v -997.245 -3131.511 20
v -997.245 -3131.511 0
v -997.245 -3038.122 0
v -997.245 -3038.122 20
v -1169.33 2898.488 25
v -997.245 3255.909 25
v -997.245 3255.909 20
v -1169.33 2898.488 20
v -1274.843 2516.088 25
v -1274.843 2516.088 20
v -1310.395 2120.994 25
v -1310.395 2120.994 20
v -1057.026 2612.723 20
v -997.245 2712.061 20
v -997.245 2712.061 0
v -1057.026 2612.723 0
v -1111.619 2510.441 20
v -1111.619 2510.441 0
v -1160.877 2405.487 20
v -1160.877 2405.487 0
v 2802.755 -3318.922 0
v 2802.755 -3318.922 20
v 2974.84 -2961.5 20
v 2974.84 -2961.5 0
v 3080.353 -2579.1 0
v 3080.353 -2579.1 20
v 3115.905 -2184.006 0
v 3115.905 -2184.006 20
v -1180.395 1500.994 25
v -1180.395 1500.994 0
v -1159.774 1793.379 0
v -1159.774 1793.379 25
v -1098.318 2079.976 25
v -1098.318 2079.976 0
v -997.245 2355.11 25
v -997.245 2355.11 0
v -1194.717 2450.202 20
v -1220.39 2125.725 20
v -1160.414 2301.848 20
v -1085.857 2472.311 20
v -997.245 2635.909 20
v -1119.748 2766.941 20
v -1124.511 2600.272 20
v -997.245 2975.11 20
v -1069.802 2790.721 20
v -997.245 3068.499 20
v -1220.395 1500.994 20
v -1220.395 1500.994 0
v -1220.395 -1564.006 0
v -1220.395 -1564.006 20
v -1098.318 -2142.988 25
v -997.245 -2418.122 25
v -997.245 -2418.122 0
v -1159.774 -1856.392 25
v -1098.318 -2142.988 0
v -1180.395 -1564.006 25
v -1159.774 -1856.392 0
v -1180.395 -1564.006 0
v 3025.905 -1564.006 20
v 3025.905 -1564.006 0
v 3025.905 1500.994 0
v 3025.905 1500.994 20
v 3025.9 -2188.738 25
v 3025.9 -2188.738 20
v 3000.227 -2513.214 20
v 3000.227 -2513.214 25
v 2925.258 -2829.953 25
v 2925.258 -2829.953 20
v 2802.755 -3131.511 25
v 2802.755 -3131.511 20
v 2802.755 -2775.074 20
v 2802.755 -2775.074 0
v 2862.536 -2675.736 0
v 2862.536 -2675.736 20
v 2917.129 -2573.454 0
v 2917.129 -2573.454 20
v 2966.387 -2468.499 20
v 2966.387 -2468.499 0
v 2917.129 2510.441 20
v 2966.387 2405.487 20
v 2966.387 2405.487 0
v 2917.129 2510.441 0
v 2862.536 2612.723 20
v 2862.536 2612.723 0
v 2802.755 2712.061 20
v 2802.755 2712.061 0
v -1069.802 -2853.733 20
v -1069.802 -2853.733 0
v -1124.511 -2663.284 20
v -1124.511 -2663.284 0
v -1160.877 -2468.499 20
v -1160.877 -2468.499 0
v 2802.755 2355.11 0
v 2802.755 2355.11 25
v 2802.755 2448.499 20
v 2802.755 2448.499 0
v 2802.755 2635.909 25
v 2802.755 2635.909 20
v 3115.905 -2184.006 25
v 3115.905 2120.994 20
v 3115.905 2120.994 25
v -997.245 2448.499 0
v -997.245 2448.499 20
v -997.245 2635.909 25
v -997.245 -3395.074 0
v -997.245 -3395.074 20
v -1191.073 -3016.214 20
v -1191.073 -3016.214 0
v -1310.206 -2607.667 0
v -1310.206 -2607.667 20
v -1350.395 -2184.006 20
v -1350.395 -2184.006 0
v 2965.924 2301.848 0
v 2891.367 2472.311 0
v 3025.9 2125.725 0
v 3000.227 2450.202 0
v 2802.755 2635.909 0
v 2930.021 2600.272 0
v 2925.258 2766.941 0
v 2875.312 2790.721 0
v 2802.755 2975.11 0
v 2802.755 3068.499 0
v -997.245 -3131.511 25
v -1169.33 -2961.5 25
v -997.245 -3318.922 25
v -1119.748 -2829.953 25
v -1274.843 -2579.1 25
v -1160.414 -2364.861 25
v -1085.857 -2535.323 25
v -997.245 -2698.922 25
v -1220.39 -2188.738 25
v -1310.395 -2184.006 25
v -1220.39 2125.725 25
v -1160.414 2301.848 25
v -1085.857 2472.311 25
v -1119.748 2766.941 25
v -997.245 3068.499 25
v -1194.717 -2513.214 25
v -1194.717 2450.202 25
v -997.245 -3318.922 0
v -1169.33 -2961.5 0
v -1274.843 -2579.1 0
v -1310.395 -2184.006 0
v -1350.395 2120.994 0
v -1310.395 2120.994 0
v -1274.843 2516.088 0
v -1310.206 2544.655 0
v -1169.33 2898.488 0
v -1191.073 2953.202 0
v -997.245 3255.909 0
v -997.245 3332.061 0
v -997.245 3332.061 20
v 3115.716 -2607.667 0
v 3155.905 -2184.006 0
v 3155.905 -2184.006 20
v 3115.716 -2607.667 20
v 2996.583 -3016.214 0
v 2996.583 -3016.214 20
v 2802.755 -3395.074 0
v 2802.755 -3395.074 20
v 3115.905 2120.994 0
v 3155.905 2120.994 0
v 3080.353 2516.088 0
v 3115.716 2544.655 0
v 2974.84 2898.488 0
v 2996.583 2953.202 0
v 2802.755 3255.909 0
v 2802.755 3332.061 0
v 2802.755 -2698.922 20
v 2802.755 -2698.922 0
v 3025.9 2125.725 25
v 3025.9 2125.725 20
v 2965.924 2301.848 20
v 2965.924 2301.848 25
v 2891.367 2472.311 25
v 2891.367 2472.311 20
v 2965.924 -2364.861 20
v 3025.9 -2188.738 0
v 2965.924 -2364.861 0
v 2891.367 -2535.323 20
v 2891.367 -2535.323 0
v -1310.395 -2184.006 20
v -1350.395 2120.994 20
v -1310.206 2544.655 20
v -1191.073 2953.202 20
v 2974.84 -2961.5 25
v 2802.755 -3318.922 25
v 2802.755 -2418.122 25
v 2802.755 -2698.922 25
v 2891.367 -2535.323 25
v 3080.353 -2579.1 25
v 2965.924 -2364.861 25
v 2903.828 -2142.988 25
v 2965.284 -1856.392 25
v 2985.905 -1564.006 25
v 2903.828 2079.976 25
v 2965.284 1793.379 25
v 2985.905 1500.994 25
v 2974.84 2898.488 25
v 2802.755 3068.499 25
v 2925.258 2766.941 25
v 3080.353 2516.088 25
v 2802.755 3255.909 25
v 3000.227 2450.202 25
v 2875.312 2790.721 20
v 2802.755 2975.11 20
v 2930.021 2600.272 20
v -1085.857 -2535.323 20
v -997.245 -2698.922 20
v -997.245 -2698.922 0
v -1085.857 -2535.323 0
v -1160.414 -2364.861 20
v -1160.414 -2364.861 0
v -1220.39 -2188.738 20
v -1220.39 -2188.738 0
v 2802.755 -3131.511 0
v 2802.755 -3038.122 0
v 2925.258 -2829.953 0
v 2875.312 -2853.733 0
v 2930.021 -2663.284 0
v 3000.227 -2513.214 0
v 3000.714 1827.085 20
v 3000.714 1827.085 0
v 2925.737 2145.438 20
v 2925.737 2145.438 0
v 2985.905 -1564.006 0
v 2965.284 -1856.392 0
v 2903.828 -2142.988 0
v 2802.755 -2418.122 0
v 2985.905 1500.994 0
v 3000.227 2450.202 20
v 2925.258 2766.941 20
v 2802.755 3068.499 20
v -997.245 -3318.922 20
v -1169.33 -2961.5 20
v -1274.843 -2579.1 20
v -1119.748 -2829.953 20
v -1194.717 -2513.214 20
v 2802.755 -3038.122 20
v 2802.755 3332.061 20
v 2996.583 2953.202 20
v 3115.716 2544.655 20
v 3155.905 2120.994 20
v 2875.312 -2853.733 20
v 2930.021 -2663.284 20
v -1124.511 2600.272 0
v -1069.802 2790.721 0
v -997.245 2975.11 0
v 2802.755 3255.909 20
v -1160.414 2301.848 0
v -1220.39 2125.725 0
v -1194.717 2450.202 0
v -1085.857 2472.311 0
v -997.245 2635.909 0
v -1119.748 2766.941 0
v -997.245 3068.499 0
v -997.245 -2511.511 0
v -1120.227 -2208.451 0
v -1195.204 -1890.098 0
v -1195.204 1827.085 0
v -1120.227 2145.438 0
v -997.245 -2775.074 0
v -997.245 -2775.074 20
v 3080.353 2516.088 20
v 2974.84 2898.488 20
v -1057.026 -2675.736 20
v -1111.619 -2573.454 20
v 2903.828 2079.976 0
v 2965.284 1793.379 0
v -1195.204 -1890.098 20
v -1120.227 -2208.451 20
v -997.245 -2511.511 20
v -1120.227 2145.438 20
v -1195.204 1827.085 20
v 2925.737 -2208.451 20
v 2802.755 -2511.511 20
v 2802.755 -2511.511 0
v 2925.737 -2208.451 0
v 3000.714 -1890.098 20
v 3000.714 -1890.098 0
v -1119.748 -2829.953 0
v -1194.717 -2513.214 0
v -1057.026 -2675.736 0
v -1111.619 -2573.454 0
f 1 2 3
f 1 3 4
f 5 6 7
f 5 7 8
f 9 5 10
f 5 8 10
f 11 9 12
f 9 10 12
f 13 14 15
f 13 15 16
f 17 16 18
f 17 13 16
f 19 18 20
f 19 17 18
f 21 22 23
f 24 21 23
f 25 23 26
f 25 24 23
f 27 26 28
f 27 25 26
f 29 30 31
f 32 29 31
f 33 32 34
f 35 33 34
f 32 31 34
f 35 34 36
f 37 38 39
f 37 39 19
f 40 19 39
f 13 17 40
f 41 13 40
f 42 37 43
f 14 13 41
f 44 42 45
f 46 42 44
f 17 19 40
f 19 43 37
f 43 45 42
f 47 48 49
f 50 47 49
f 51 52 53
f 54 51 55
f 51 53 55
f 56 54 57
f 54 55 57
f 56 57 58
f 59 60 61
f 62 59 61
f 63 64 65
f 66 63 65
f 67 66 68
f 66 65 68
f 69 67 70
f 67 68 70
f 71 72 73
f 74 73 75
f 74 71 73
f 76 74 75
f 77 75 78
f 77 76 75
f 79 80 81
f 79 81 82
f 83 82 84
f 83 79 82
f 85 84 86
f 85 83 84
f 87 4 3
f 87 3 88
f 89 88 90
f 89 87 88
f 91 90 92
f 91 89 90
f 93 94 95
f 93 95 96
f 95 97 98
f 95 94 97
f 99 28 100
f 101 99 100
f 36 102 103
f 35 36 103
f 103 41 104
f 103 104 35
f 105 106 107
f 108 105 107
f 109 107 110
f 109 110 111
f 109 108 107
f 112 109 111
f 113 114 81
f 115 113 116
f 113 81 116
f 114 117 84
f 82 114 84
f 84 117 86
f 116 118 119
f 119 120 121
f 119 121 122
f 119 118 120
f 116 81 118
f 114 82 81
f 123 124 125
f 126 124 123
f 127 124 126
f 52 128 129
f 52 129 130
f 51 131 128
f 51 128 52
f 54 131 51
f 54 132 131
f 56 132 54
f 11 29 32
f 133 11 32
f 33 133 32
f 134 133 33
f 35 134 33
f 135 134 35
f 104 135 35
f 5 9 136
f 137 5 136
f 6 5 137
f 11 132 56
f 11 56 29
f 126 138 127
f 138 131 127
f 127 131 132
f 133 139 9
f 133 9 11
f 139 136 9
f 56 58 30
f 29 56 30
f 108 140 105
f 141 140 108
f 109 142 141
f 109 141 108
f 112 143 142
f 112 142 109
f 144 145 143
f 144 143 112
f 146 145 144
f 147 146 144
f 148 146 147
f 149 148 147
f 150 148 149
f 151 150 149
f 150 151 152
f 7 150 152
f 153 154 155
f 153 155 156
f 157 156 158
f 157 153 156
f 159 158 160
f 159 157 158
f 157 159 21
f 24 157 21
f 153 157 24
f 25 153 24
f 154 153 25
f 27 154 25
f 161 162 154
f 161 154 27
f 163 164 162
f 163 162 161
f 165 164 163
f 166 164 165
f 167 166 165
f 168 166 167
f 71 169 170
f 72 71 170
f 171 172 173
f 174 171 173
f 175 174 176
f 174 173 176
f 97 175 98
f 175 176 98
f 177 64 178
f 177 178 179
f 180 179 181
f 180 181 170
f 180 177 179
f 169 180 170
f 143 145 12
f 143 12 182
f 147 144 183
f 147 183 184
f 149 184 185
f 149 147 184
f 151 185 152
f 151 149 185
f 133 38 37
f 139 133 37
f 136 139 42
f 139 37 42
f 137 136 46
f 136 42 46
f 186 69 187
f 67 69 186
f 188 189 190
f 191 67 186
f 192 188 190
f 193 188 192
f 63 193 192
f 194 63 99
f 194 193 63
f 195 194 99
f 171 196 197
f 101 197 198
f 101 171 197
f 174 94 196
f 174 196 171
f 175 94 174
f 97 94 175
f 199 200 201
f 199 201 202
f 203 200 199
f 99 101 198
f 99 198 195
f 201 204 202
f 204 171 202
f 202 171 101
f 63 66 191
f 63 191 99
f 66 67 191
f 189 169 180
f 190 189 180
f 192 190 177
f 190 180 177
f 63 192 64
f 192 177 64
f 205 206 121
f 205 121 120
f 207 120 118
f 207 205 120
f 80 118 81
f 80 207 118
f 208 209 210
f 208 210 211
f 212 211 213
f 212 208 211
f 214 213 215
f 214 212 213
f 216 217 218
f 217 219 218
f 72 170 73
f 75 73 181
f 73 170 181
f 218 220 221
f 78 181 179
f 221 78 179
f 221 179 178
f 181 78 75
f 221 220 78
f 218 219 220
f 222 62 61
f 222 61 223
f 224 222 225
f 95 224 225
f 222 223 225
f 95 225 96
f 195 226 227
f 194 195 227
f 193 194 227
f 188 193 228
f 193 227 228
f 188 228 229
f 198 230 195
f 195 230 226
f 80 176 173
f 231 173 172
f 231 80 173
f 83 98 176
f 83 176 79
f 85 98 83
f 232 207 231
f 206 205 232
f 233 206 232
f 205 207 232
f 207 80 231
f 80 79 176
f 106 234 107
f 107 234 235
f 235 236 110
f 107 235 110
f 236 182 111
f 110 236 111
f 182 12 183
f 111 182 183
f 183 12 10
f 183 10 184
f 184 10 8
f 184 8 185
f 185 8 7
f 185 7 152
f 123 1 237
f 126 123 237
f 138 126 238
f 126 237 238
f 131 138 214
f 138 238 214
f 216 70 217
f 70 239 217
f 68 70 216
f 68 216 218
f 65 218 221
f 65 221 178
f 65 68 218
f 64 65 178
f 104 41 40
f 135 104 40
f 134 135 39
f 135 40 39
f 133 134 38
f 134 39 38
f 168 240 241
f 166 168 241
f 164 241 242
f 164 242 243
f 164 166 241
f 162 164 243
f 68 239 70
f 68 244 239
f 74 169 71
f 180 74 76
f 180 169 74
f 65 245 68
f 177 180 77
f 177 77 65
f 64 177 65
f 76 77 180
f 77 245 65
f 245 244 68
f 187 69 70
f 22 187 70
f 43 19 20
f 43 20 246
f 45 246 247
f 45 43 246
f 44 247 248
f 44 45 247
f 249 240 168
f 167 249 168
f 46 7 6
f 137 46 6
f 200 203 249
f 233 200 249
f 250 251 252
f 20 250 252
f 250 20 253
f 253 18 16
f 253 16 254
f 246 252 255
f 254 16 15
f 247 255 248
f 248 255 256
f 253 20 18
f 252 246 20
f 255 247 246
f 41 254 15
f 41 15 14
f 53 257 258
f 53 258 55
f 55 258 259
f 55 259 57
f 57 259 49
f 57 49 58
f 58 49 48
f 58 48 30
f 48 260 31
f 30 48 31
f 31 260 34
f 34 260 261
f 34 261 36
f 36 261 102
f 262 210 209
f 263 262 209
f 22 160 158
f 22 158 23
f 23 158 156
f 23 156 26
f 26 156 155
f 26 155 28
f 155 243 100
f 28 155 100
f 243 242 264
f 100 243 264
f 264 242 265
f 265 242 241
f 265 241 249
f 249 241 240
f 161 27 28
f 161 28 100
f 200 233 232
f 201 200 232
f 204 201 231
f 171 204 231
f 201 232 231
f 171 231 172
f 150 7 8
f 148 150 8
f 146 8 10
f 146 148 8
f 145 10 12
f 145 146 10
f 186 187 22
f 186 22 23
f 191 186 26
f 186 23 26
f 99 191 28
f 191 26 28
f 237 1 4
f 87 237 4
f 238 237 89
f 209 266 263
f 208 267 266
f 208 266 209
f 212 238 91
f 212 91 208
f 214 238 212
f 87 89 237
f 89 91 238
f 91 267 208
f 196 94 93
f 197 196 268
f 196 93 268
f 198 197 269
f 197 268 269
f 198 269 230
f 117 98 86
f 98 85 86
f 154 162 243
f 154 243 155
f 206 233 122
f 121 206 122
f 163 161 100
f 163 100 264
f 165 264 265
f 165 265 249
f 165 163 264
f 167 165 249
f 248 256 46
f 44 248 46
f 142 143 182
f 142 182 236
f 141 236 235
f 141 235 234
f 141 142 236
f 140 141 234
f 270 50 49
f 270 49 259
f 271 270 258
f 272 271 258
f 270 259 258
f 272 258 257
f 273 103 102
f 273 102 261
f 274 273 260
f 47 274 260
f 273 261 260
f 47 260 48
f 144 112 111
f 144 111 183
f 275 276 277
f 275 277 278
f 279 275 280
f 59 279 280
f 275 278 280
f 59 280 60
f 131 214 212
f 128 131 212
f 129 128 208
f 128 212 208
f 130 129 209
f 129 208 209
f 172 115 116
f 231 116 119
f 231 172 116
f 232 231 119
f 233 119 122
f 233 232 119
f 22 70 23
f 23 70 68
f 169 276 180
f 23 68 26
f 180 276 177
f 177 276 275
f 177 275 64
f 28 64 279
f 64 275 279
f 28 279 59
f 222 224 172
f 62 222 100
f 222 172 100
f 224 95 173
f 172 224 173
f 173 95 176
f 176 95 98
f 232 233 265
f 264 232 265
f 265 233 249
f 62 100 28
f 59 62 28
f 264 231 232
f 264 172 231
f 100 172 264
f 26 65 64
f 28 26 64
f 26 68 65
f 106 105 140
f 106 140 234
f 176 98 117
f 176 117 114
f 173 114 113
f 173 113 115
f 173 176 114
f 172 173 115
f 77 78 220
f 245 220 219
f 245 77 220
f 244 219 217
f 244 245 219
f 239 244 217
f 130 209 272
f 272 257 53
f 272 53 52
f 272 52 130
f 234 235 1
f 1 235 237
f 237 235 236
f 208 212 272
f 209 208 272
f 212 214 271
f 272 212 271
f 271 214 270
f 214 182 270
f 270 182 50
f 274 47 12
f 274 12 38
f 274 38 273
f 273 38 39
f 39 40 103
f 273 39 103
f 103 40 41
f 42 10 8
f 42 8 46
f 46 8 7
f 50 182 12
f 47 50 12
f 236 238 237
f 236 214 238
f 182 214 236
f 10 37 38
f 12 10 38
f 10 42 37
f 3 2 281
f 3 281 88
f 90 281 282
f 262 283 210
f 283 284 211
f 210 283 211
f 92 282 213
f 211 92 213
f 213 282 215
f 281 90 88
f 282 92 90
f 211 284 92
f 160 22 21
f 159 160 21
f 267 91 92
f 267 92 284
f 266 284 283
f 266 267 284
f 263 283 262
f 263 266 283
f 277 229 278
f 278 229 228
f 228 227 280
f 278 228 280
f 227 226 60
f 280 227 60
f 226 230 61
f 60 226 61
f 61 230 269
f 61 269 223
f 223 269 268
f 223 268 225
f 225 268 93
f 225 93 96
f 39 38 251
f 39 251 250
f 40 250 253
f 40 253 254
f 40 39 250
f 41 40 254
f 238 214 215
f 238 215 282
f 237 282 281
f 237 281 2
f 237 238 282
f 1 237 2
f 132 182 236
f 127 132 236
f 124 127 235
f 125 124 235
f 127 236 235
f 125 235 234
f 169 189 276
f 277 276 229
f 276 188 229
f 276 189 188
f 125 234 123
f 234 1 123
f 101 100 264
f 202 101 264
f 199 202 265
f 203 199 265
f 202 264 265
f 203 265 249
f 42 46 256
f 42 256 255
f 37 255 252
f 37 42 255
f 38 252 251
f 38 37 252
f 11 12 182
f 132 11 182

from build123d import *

# Parameters (mm, degrees)
BOSS_EXTRUDE1_DEPTH   = 20
BOSS_EXTRUDE1_2_DEPTH = 20
BOSS_EXTRUDE2_DEPTH   = 20
BOSS_EXTRUDE2_2_DEPTH = 20
BOSS_EXTRUDE3_DEPTH   = 5
SKETCH5_W             = 3800
SKETCH5_H             = 576.541900626
CUT_EXTRUDE1_DEPTH    = 9360.453457287


with BuildPart() as part:
    # Sketch1 → Boss-Extrude1 (new body)
    with BuildSketch(Plane.XY):
        with BuildLine():
            ThreePointArc((3025.904993677, 1500.993778109), (902.754993677, 3624.143778109), (-1220.395006323, 1500.993778109))
            Line((-1220.395006323, 1500.993778109), (-1220.395006323, -1564.006221891))
            ThreePointArc((-1220.395006323, -1564.006221891), (902.754993677, -3687.156221891), (3025.904993677, -1564.006221891))
            Line((3025.904993677, -1564.006221891), (3025.904993677, 1500.993778109))
        make_face()
        with BuildLine():
            Line((-1180.395006323, -1564.006221891), (-1180.395006323, 1500.993778109))
            ThreePointArc((-1180.395006323, 1500.993778109), (902.754993677, 3584.143778109), (2985.904993677, 1500.993778109))
            Line((2985.904993677, 1500.993778109), (2985.904993677, -1564.006221891))
            ThreePointArc((2985.904993677, -1564.006221891), (902.754993677, -3647.156221891), (-1180.395006323, -1564.006221891))
        make_face(mode=Mode.SUBTRACT)
    extrude(amount=BOSS_EXTRUDE1_DEPTH)

    # Sketch3 → Boss-Extrude3 (add)
    with BuildSketch(Plane.XY.offset(20)):
        with BuildLine():
            ThreePointArc((-1310.395006323, -2184.006221891), (902.754993677, -4397.156221891), (3115.904993677, -2184.006221891))
            Line((3115.904993677, -2184.006221891), (3115.904993677, 2120.993778109))
            ThreePointArc((3115.904993677, 2120.993778109), (902.754993677, 4334.143778109), (-1310.395006323, 2120.993778109))
            Line((-1310.395006323, 2120.993778109), (-1310.395006323, -2184.006221891))
        make_face()
        with BuildLine():
            ThreePointArc((3025.899721638, -2188.737673504), (902.754993677, -4307.156221891), (-1220.389734283, -2188.737673504))
            ThreePointArc((-1220.389734283, -2188.737673504), (902.754993677, -3777.156221891), (3025.899721638, -2188.737673504))
        make_face(mode=Mode.SUBTRACT)
        with BuildLine():
            ThreePointArc((-1180.395006323, 1500.993778109), (902.754993677, 3584.143778109), (2985.904993677, 1500.993778109))
            Line((2985.904993677, 1500.993778109), (2985.904993677, -1564.006221891))
            ThreePointArc((2985.904993677, -1564.006221891), (902.754993677, -3647.156221891), (-1180.395006323, -1564.006221891))
            Line((-1180.395006323, -1564.006221891), (-1180.395006323, 1500.993778109))
        make_face(mode=Mode.SUBTRACT)
        with BuildLine():
            ThreePointArc((-1220.389734283, 2125.725229722), (902.754993677, 4244.143778109), (3025.899721638, 2125.725229722))
            ThreePointArc((3025.899721638, 2125.725229722), (902.754993677, 3714.143778109), (-1220.389734283, 2125.725229722))
        make_face(mode=Mode.SUBTRACT)
    extrude(amount=BOSS_EXTRUDE3_DEPTH)


with BuildPart() as body_2:
    # Sketch1 → Boss-Extrude1 2 (new body)
    with BuildSketch(Plane.XY):
        with BuildLine():
            ThreePointArc((3155.904993677, 2120.993778109), (902.754993677, 4374.143778109), (-1350.395006323, 2120.993778109))
            Line((-1350.395006323, 2120.993778109), (-1350.395006323, -2184.006221891))
            ThreePointArc((-1350.395006323, -2184.006221891), (902.754993677, -4437.156221891), (3155.904993677, -2184.006221891))
            Line((3155.904993677, -2184.006221891), (3155.904993677, 2120.993778109))
        make_face()
        with BuildLine():
            Line((-1310.395006323, -2184.006221891), (-1310.395006323, 2120.993778109))
            ThreePointArc((-1310.395006323, 2120.993778109), (902.754993677, 4334.143778109), (3115.904993677, 2120.993778109))
            Line((3115.904993677, 2120.993778109), (3115.904993677, -2184.006221891))
            ThreePointArc((3115.904993677, -2184.006221891), (902.754993677, -4397.156221891), (-1310.395006323, -2184.006221891))
        make_face(mode=Mode.SUBTRACT)
    extrude(amount=BOSS_EXTRUDE1_2_DEPTH)


with BuildPart() as body_3:
    # Sketch2 → Boss-Extrude2 (new body)
    with BuildSketch(Plane.XY.offset(20)):
        with BuildLine():
            ThreePointArc((3025.899721638, 2125.725229722), (902.754993677, 4244.143778109), (-1220.389734283, 2125.725229722))
            ThreePointArc((-1220.389734283, 2125.725229722), (902.754993677, 3714.143778109), (3025.899721638, 2125.725229722))
        make_face()
        with BuildLine():
            ThreePointArc((-1160.877193096, 2405.486520044), (902.754993677, 4204.143778109), (2966.387180451, 2405.486520044))
            ThreePointArc((2966.387180451, 2405.486520044), (902.754993677, 3754.143778109), (-1160.877193096, 2405.486520044))
        make_face(mode=Mode.SUBTRACT)
    extrude(amount=-BOSS_EXTRUDE2_DEPTH)


with BuildPart() as body_4:
    # Sketch2 → Boss-Extrude2 2 (new body)
    with BuildSketch(Plane.XY.offset(20)):
        with BuildLine():
            ThreePointArc((-1220.389734283, -2188.737673504), (902.754993677, -4307.156221891), (3025.899721638, -2188.737673504))
            ThreePointArc((3025.899721638, -2188.737673504), (902.754993677, -3777.156221891), (-1220.389734283, -2188.737673504))
        make_face()
        with BuildLine():
            ThreePointArc((2966.387180451, -2468.498963827), (902.754993677, -4267.156221891), (-1160.877193096, -2468.498963827))
            ThreePointArc((-1160.877193096, -2468.498963827), (902.754993677, -3817.156221891), (2966.387180451, -2468.498963827))
        make_face(mode=Mode.SUBTRACT)
    extrude(amount=-BOSS_EXTRUDE2_2_DEPTH)


with BuildPart() as cut_extrude1_tool:
    # Sketch5 → Cut-Extrude1 (new, through all)
    with BuildSketch(Plane(origin=(0, 4374.143778109, 0), x_dir=(1, 0, 0), z_dir=(0, 1, 0))):
        with Locations((902.754993677, -10)):
            Rectangle(SKETCH5_W, SKETCH5_H)
    extrude(amount=-CUT_EXTRUDE1_DEPTH)


with BuildPart() as part_1:
    add(part.part)

    # Cut-Extrude1: cut by cut_extrude1_tool
    add(cut_extrude1_tool.part, mode=Mode.SUBTRACT)


with BuildPart() as body_2_1:
    add(body_2.part)

    # Cut-Extrude1: cut by cut_extrude1_tool
    add(cut_extrude1_tool.part, mode=Mode.SUBTRACT)


with BuildPart() as body_3_1:
    add(body_3.part)

    # Cut-Extrude1: cut by cut_extrude1_tool
    add(cut_extrude1_tool.part, mode=Mode.SUBTRACT)


with BuildPart() as body_4_1:
    add(body_4.part)

    # Cut-Extrude1: cut by cut_extrude1_tool
    add(cut_extrude1_tool.part, mode=Mode.SUBTRACT)


with BuildPart() as cut_extrude1_piece_1:
    # of the separate pieces the step leaves, piece 1, a body of its own (cut_extrude1_pieces)
    add(part_1.part.solids().sort_by_distance((-997.245006323, 2448.498882317, 0))[0])


with BuildPart() as cut_extrude1_piece_2:
    # of the separate pieces the step leaves, piece 2, a body of its own (cut_extrude1_pieces)
    add(part_1.part.solids().sort_by_distance((3025.904993677, 1500.993778109, 0))[0])


with BuildPart() as cut_extrude1_piece_1_of_body_2:
    # of the separate pieces the step leaves, piece 1, a body of its own (cut_extrude1_pieces_of_body_2)
    add(body_2_1.part.solids().sort_by_distance((2802.754993677, -3395.073900636, 0))[0])


with BuildPart() as cut_extrude1_piece_2_of_body_2:
    # of the separate pieces the step leaves, piece 2, a body of its own (cut_extrude1_pieces_of_body_2)
    add(body_2_1.part.solids().sort_by_distance((-1350.395006323, -2184.006221891, 0))[0])


with BuildPart() as cut_extrude1_piece_1_of_body_3:
    # of the separate pieces the step leaves, piece 1, a body of its own (cut_extrude1_pieces_of_body_3)
    add(body_3_1.part.solids().sort_by_distance((2802.754993677, 2635.909159316, 20))[0])


with BuildPart() as cut_extrude1_piece_2_of_body_3:
    # of the separate pieces the step leaves, piece 2, a body of its own (cut_extrude1_pieces_of_body_3)
    add(body_3_1.part.solids().sort_by_distance((-1220.389734283, 2125.725229722, 20))[0])


with BuildPart() as cut_extrude1_piece_1_of_body_4:
    # of the separate pieces the step leaves, piece 1, a body of its own (cut_extrude1_pieces_of_body_4)
    add(body_4_1.part.solids().sort_by_distance((-997.245006323, -2698.921603098, 20))[0])


with BuildPart() as cut_extrude1_piece_2_of_body_4:
    # of the separate pieces the step leaves, piece 2, a body of its own (cut_extrude1_pieces_of_body_4)
    add(body_4_1.part.solids().sort_by_distance((3025.899721638, -2188.737673504, 20))[0])


solid = Compound([cut_extrude1_piece_1.part, cut_extrude1_piece_2.part, cut_extrude1_piece_1_of_body_2.part, cut_extrude1_piece_2_of_body_2.part, cut_extrude1_piece_1_of_body_3.part, cut_extrude1_piece_2_of_body_3.part, cut_extrude1_piece_1_of_body_4.part, cut_extrude1_piece_2_of_body_4.part])
